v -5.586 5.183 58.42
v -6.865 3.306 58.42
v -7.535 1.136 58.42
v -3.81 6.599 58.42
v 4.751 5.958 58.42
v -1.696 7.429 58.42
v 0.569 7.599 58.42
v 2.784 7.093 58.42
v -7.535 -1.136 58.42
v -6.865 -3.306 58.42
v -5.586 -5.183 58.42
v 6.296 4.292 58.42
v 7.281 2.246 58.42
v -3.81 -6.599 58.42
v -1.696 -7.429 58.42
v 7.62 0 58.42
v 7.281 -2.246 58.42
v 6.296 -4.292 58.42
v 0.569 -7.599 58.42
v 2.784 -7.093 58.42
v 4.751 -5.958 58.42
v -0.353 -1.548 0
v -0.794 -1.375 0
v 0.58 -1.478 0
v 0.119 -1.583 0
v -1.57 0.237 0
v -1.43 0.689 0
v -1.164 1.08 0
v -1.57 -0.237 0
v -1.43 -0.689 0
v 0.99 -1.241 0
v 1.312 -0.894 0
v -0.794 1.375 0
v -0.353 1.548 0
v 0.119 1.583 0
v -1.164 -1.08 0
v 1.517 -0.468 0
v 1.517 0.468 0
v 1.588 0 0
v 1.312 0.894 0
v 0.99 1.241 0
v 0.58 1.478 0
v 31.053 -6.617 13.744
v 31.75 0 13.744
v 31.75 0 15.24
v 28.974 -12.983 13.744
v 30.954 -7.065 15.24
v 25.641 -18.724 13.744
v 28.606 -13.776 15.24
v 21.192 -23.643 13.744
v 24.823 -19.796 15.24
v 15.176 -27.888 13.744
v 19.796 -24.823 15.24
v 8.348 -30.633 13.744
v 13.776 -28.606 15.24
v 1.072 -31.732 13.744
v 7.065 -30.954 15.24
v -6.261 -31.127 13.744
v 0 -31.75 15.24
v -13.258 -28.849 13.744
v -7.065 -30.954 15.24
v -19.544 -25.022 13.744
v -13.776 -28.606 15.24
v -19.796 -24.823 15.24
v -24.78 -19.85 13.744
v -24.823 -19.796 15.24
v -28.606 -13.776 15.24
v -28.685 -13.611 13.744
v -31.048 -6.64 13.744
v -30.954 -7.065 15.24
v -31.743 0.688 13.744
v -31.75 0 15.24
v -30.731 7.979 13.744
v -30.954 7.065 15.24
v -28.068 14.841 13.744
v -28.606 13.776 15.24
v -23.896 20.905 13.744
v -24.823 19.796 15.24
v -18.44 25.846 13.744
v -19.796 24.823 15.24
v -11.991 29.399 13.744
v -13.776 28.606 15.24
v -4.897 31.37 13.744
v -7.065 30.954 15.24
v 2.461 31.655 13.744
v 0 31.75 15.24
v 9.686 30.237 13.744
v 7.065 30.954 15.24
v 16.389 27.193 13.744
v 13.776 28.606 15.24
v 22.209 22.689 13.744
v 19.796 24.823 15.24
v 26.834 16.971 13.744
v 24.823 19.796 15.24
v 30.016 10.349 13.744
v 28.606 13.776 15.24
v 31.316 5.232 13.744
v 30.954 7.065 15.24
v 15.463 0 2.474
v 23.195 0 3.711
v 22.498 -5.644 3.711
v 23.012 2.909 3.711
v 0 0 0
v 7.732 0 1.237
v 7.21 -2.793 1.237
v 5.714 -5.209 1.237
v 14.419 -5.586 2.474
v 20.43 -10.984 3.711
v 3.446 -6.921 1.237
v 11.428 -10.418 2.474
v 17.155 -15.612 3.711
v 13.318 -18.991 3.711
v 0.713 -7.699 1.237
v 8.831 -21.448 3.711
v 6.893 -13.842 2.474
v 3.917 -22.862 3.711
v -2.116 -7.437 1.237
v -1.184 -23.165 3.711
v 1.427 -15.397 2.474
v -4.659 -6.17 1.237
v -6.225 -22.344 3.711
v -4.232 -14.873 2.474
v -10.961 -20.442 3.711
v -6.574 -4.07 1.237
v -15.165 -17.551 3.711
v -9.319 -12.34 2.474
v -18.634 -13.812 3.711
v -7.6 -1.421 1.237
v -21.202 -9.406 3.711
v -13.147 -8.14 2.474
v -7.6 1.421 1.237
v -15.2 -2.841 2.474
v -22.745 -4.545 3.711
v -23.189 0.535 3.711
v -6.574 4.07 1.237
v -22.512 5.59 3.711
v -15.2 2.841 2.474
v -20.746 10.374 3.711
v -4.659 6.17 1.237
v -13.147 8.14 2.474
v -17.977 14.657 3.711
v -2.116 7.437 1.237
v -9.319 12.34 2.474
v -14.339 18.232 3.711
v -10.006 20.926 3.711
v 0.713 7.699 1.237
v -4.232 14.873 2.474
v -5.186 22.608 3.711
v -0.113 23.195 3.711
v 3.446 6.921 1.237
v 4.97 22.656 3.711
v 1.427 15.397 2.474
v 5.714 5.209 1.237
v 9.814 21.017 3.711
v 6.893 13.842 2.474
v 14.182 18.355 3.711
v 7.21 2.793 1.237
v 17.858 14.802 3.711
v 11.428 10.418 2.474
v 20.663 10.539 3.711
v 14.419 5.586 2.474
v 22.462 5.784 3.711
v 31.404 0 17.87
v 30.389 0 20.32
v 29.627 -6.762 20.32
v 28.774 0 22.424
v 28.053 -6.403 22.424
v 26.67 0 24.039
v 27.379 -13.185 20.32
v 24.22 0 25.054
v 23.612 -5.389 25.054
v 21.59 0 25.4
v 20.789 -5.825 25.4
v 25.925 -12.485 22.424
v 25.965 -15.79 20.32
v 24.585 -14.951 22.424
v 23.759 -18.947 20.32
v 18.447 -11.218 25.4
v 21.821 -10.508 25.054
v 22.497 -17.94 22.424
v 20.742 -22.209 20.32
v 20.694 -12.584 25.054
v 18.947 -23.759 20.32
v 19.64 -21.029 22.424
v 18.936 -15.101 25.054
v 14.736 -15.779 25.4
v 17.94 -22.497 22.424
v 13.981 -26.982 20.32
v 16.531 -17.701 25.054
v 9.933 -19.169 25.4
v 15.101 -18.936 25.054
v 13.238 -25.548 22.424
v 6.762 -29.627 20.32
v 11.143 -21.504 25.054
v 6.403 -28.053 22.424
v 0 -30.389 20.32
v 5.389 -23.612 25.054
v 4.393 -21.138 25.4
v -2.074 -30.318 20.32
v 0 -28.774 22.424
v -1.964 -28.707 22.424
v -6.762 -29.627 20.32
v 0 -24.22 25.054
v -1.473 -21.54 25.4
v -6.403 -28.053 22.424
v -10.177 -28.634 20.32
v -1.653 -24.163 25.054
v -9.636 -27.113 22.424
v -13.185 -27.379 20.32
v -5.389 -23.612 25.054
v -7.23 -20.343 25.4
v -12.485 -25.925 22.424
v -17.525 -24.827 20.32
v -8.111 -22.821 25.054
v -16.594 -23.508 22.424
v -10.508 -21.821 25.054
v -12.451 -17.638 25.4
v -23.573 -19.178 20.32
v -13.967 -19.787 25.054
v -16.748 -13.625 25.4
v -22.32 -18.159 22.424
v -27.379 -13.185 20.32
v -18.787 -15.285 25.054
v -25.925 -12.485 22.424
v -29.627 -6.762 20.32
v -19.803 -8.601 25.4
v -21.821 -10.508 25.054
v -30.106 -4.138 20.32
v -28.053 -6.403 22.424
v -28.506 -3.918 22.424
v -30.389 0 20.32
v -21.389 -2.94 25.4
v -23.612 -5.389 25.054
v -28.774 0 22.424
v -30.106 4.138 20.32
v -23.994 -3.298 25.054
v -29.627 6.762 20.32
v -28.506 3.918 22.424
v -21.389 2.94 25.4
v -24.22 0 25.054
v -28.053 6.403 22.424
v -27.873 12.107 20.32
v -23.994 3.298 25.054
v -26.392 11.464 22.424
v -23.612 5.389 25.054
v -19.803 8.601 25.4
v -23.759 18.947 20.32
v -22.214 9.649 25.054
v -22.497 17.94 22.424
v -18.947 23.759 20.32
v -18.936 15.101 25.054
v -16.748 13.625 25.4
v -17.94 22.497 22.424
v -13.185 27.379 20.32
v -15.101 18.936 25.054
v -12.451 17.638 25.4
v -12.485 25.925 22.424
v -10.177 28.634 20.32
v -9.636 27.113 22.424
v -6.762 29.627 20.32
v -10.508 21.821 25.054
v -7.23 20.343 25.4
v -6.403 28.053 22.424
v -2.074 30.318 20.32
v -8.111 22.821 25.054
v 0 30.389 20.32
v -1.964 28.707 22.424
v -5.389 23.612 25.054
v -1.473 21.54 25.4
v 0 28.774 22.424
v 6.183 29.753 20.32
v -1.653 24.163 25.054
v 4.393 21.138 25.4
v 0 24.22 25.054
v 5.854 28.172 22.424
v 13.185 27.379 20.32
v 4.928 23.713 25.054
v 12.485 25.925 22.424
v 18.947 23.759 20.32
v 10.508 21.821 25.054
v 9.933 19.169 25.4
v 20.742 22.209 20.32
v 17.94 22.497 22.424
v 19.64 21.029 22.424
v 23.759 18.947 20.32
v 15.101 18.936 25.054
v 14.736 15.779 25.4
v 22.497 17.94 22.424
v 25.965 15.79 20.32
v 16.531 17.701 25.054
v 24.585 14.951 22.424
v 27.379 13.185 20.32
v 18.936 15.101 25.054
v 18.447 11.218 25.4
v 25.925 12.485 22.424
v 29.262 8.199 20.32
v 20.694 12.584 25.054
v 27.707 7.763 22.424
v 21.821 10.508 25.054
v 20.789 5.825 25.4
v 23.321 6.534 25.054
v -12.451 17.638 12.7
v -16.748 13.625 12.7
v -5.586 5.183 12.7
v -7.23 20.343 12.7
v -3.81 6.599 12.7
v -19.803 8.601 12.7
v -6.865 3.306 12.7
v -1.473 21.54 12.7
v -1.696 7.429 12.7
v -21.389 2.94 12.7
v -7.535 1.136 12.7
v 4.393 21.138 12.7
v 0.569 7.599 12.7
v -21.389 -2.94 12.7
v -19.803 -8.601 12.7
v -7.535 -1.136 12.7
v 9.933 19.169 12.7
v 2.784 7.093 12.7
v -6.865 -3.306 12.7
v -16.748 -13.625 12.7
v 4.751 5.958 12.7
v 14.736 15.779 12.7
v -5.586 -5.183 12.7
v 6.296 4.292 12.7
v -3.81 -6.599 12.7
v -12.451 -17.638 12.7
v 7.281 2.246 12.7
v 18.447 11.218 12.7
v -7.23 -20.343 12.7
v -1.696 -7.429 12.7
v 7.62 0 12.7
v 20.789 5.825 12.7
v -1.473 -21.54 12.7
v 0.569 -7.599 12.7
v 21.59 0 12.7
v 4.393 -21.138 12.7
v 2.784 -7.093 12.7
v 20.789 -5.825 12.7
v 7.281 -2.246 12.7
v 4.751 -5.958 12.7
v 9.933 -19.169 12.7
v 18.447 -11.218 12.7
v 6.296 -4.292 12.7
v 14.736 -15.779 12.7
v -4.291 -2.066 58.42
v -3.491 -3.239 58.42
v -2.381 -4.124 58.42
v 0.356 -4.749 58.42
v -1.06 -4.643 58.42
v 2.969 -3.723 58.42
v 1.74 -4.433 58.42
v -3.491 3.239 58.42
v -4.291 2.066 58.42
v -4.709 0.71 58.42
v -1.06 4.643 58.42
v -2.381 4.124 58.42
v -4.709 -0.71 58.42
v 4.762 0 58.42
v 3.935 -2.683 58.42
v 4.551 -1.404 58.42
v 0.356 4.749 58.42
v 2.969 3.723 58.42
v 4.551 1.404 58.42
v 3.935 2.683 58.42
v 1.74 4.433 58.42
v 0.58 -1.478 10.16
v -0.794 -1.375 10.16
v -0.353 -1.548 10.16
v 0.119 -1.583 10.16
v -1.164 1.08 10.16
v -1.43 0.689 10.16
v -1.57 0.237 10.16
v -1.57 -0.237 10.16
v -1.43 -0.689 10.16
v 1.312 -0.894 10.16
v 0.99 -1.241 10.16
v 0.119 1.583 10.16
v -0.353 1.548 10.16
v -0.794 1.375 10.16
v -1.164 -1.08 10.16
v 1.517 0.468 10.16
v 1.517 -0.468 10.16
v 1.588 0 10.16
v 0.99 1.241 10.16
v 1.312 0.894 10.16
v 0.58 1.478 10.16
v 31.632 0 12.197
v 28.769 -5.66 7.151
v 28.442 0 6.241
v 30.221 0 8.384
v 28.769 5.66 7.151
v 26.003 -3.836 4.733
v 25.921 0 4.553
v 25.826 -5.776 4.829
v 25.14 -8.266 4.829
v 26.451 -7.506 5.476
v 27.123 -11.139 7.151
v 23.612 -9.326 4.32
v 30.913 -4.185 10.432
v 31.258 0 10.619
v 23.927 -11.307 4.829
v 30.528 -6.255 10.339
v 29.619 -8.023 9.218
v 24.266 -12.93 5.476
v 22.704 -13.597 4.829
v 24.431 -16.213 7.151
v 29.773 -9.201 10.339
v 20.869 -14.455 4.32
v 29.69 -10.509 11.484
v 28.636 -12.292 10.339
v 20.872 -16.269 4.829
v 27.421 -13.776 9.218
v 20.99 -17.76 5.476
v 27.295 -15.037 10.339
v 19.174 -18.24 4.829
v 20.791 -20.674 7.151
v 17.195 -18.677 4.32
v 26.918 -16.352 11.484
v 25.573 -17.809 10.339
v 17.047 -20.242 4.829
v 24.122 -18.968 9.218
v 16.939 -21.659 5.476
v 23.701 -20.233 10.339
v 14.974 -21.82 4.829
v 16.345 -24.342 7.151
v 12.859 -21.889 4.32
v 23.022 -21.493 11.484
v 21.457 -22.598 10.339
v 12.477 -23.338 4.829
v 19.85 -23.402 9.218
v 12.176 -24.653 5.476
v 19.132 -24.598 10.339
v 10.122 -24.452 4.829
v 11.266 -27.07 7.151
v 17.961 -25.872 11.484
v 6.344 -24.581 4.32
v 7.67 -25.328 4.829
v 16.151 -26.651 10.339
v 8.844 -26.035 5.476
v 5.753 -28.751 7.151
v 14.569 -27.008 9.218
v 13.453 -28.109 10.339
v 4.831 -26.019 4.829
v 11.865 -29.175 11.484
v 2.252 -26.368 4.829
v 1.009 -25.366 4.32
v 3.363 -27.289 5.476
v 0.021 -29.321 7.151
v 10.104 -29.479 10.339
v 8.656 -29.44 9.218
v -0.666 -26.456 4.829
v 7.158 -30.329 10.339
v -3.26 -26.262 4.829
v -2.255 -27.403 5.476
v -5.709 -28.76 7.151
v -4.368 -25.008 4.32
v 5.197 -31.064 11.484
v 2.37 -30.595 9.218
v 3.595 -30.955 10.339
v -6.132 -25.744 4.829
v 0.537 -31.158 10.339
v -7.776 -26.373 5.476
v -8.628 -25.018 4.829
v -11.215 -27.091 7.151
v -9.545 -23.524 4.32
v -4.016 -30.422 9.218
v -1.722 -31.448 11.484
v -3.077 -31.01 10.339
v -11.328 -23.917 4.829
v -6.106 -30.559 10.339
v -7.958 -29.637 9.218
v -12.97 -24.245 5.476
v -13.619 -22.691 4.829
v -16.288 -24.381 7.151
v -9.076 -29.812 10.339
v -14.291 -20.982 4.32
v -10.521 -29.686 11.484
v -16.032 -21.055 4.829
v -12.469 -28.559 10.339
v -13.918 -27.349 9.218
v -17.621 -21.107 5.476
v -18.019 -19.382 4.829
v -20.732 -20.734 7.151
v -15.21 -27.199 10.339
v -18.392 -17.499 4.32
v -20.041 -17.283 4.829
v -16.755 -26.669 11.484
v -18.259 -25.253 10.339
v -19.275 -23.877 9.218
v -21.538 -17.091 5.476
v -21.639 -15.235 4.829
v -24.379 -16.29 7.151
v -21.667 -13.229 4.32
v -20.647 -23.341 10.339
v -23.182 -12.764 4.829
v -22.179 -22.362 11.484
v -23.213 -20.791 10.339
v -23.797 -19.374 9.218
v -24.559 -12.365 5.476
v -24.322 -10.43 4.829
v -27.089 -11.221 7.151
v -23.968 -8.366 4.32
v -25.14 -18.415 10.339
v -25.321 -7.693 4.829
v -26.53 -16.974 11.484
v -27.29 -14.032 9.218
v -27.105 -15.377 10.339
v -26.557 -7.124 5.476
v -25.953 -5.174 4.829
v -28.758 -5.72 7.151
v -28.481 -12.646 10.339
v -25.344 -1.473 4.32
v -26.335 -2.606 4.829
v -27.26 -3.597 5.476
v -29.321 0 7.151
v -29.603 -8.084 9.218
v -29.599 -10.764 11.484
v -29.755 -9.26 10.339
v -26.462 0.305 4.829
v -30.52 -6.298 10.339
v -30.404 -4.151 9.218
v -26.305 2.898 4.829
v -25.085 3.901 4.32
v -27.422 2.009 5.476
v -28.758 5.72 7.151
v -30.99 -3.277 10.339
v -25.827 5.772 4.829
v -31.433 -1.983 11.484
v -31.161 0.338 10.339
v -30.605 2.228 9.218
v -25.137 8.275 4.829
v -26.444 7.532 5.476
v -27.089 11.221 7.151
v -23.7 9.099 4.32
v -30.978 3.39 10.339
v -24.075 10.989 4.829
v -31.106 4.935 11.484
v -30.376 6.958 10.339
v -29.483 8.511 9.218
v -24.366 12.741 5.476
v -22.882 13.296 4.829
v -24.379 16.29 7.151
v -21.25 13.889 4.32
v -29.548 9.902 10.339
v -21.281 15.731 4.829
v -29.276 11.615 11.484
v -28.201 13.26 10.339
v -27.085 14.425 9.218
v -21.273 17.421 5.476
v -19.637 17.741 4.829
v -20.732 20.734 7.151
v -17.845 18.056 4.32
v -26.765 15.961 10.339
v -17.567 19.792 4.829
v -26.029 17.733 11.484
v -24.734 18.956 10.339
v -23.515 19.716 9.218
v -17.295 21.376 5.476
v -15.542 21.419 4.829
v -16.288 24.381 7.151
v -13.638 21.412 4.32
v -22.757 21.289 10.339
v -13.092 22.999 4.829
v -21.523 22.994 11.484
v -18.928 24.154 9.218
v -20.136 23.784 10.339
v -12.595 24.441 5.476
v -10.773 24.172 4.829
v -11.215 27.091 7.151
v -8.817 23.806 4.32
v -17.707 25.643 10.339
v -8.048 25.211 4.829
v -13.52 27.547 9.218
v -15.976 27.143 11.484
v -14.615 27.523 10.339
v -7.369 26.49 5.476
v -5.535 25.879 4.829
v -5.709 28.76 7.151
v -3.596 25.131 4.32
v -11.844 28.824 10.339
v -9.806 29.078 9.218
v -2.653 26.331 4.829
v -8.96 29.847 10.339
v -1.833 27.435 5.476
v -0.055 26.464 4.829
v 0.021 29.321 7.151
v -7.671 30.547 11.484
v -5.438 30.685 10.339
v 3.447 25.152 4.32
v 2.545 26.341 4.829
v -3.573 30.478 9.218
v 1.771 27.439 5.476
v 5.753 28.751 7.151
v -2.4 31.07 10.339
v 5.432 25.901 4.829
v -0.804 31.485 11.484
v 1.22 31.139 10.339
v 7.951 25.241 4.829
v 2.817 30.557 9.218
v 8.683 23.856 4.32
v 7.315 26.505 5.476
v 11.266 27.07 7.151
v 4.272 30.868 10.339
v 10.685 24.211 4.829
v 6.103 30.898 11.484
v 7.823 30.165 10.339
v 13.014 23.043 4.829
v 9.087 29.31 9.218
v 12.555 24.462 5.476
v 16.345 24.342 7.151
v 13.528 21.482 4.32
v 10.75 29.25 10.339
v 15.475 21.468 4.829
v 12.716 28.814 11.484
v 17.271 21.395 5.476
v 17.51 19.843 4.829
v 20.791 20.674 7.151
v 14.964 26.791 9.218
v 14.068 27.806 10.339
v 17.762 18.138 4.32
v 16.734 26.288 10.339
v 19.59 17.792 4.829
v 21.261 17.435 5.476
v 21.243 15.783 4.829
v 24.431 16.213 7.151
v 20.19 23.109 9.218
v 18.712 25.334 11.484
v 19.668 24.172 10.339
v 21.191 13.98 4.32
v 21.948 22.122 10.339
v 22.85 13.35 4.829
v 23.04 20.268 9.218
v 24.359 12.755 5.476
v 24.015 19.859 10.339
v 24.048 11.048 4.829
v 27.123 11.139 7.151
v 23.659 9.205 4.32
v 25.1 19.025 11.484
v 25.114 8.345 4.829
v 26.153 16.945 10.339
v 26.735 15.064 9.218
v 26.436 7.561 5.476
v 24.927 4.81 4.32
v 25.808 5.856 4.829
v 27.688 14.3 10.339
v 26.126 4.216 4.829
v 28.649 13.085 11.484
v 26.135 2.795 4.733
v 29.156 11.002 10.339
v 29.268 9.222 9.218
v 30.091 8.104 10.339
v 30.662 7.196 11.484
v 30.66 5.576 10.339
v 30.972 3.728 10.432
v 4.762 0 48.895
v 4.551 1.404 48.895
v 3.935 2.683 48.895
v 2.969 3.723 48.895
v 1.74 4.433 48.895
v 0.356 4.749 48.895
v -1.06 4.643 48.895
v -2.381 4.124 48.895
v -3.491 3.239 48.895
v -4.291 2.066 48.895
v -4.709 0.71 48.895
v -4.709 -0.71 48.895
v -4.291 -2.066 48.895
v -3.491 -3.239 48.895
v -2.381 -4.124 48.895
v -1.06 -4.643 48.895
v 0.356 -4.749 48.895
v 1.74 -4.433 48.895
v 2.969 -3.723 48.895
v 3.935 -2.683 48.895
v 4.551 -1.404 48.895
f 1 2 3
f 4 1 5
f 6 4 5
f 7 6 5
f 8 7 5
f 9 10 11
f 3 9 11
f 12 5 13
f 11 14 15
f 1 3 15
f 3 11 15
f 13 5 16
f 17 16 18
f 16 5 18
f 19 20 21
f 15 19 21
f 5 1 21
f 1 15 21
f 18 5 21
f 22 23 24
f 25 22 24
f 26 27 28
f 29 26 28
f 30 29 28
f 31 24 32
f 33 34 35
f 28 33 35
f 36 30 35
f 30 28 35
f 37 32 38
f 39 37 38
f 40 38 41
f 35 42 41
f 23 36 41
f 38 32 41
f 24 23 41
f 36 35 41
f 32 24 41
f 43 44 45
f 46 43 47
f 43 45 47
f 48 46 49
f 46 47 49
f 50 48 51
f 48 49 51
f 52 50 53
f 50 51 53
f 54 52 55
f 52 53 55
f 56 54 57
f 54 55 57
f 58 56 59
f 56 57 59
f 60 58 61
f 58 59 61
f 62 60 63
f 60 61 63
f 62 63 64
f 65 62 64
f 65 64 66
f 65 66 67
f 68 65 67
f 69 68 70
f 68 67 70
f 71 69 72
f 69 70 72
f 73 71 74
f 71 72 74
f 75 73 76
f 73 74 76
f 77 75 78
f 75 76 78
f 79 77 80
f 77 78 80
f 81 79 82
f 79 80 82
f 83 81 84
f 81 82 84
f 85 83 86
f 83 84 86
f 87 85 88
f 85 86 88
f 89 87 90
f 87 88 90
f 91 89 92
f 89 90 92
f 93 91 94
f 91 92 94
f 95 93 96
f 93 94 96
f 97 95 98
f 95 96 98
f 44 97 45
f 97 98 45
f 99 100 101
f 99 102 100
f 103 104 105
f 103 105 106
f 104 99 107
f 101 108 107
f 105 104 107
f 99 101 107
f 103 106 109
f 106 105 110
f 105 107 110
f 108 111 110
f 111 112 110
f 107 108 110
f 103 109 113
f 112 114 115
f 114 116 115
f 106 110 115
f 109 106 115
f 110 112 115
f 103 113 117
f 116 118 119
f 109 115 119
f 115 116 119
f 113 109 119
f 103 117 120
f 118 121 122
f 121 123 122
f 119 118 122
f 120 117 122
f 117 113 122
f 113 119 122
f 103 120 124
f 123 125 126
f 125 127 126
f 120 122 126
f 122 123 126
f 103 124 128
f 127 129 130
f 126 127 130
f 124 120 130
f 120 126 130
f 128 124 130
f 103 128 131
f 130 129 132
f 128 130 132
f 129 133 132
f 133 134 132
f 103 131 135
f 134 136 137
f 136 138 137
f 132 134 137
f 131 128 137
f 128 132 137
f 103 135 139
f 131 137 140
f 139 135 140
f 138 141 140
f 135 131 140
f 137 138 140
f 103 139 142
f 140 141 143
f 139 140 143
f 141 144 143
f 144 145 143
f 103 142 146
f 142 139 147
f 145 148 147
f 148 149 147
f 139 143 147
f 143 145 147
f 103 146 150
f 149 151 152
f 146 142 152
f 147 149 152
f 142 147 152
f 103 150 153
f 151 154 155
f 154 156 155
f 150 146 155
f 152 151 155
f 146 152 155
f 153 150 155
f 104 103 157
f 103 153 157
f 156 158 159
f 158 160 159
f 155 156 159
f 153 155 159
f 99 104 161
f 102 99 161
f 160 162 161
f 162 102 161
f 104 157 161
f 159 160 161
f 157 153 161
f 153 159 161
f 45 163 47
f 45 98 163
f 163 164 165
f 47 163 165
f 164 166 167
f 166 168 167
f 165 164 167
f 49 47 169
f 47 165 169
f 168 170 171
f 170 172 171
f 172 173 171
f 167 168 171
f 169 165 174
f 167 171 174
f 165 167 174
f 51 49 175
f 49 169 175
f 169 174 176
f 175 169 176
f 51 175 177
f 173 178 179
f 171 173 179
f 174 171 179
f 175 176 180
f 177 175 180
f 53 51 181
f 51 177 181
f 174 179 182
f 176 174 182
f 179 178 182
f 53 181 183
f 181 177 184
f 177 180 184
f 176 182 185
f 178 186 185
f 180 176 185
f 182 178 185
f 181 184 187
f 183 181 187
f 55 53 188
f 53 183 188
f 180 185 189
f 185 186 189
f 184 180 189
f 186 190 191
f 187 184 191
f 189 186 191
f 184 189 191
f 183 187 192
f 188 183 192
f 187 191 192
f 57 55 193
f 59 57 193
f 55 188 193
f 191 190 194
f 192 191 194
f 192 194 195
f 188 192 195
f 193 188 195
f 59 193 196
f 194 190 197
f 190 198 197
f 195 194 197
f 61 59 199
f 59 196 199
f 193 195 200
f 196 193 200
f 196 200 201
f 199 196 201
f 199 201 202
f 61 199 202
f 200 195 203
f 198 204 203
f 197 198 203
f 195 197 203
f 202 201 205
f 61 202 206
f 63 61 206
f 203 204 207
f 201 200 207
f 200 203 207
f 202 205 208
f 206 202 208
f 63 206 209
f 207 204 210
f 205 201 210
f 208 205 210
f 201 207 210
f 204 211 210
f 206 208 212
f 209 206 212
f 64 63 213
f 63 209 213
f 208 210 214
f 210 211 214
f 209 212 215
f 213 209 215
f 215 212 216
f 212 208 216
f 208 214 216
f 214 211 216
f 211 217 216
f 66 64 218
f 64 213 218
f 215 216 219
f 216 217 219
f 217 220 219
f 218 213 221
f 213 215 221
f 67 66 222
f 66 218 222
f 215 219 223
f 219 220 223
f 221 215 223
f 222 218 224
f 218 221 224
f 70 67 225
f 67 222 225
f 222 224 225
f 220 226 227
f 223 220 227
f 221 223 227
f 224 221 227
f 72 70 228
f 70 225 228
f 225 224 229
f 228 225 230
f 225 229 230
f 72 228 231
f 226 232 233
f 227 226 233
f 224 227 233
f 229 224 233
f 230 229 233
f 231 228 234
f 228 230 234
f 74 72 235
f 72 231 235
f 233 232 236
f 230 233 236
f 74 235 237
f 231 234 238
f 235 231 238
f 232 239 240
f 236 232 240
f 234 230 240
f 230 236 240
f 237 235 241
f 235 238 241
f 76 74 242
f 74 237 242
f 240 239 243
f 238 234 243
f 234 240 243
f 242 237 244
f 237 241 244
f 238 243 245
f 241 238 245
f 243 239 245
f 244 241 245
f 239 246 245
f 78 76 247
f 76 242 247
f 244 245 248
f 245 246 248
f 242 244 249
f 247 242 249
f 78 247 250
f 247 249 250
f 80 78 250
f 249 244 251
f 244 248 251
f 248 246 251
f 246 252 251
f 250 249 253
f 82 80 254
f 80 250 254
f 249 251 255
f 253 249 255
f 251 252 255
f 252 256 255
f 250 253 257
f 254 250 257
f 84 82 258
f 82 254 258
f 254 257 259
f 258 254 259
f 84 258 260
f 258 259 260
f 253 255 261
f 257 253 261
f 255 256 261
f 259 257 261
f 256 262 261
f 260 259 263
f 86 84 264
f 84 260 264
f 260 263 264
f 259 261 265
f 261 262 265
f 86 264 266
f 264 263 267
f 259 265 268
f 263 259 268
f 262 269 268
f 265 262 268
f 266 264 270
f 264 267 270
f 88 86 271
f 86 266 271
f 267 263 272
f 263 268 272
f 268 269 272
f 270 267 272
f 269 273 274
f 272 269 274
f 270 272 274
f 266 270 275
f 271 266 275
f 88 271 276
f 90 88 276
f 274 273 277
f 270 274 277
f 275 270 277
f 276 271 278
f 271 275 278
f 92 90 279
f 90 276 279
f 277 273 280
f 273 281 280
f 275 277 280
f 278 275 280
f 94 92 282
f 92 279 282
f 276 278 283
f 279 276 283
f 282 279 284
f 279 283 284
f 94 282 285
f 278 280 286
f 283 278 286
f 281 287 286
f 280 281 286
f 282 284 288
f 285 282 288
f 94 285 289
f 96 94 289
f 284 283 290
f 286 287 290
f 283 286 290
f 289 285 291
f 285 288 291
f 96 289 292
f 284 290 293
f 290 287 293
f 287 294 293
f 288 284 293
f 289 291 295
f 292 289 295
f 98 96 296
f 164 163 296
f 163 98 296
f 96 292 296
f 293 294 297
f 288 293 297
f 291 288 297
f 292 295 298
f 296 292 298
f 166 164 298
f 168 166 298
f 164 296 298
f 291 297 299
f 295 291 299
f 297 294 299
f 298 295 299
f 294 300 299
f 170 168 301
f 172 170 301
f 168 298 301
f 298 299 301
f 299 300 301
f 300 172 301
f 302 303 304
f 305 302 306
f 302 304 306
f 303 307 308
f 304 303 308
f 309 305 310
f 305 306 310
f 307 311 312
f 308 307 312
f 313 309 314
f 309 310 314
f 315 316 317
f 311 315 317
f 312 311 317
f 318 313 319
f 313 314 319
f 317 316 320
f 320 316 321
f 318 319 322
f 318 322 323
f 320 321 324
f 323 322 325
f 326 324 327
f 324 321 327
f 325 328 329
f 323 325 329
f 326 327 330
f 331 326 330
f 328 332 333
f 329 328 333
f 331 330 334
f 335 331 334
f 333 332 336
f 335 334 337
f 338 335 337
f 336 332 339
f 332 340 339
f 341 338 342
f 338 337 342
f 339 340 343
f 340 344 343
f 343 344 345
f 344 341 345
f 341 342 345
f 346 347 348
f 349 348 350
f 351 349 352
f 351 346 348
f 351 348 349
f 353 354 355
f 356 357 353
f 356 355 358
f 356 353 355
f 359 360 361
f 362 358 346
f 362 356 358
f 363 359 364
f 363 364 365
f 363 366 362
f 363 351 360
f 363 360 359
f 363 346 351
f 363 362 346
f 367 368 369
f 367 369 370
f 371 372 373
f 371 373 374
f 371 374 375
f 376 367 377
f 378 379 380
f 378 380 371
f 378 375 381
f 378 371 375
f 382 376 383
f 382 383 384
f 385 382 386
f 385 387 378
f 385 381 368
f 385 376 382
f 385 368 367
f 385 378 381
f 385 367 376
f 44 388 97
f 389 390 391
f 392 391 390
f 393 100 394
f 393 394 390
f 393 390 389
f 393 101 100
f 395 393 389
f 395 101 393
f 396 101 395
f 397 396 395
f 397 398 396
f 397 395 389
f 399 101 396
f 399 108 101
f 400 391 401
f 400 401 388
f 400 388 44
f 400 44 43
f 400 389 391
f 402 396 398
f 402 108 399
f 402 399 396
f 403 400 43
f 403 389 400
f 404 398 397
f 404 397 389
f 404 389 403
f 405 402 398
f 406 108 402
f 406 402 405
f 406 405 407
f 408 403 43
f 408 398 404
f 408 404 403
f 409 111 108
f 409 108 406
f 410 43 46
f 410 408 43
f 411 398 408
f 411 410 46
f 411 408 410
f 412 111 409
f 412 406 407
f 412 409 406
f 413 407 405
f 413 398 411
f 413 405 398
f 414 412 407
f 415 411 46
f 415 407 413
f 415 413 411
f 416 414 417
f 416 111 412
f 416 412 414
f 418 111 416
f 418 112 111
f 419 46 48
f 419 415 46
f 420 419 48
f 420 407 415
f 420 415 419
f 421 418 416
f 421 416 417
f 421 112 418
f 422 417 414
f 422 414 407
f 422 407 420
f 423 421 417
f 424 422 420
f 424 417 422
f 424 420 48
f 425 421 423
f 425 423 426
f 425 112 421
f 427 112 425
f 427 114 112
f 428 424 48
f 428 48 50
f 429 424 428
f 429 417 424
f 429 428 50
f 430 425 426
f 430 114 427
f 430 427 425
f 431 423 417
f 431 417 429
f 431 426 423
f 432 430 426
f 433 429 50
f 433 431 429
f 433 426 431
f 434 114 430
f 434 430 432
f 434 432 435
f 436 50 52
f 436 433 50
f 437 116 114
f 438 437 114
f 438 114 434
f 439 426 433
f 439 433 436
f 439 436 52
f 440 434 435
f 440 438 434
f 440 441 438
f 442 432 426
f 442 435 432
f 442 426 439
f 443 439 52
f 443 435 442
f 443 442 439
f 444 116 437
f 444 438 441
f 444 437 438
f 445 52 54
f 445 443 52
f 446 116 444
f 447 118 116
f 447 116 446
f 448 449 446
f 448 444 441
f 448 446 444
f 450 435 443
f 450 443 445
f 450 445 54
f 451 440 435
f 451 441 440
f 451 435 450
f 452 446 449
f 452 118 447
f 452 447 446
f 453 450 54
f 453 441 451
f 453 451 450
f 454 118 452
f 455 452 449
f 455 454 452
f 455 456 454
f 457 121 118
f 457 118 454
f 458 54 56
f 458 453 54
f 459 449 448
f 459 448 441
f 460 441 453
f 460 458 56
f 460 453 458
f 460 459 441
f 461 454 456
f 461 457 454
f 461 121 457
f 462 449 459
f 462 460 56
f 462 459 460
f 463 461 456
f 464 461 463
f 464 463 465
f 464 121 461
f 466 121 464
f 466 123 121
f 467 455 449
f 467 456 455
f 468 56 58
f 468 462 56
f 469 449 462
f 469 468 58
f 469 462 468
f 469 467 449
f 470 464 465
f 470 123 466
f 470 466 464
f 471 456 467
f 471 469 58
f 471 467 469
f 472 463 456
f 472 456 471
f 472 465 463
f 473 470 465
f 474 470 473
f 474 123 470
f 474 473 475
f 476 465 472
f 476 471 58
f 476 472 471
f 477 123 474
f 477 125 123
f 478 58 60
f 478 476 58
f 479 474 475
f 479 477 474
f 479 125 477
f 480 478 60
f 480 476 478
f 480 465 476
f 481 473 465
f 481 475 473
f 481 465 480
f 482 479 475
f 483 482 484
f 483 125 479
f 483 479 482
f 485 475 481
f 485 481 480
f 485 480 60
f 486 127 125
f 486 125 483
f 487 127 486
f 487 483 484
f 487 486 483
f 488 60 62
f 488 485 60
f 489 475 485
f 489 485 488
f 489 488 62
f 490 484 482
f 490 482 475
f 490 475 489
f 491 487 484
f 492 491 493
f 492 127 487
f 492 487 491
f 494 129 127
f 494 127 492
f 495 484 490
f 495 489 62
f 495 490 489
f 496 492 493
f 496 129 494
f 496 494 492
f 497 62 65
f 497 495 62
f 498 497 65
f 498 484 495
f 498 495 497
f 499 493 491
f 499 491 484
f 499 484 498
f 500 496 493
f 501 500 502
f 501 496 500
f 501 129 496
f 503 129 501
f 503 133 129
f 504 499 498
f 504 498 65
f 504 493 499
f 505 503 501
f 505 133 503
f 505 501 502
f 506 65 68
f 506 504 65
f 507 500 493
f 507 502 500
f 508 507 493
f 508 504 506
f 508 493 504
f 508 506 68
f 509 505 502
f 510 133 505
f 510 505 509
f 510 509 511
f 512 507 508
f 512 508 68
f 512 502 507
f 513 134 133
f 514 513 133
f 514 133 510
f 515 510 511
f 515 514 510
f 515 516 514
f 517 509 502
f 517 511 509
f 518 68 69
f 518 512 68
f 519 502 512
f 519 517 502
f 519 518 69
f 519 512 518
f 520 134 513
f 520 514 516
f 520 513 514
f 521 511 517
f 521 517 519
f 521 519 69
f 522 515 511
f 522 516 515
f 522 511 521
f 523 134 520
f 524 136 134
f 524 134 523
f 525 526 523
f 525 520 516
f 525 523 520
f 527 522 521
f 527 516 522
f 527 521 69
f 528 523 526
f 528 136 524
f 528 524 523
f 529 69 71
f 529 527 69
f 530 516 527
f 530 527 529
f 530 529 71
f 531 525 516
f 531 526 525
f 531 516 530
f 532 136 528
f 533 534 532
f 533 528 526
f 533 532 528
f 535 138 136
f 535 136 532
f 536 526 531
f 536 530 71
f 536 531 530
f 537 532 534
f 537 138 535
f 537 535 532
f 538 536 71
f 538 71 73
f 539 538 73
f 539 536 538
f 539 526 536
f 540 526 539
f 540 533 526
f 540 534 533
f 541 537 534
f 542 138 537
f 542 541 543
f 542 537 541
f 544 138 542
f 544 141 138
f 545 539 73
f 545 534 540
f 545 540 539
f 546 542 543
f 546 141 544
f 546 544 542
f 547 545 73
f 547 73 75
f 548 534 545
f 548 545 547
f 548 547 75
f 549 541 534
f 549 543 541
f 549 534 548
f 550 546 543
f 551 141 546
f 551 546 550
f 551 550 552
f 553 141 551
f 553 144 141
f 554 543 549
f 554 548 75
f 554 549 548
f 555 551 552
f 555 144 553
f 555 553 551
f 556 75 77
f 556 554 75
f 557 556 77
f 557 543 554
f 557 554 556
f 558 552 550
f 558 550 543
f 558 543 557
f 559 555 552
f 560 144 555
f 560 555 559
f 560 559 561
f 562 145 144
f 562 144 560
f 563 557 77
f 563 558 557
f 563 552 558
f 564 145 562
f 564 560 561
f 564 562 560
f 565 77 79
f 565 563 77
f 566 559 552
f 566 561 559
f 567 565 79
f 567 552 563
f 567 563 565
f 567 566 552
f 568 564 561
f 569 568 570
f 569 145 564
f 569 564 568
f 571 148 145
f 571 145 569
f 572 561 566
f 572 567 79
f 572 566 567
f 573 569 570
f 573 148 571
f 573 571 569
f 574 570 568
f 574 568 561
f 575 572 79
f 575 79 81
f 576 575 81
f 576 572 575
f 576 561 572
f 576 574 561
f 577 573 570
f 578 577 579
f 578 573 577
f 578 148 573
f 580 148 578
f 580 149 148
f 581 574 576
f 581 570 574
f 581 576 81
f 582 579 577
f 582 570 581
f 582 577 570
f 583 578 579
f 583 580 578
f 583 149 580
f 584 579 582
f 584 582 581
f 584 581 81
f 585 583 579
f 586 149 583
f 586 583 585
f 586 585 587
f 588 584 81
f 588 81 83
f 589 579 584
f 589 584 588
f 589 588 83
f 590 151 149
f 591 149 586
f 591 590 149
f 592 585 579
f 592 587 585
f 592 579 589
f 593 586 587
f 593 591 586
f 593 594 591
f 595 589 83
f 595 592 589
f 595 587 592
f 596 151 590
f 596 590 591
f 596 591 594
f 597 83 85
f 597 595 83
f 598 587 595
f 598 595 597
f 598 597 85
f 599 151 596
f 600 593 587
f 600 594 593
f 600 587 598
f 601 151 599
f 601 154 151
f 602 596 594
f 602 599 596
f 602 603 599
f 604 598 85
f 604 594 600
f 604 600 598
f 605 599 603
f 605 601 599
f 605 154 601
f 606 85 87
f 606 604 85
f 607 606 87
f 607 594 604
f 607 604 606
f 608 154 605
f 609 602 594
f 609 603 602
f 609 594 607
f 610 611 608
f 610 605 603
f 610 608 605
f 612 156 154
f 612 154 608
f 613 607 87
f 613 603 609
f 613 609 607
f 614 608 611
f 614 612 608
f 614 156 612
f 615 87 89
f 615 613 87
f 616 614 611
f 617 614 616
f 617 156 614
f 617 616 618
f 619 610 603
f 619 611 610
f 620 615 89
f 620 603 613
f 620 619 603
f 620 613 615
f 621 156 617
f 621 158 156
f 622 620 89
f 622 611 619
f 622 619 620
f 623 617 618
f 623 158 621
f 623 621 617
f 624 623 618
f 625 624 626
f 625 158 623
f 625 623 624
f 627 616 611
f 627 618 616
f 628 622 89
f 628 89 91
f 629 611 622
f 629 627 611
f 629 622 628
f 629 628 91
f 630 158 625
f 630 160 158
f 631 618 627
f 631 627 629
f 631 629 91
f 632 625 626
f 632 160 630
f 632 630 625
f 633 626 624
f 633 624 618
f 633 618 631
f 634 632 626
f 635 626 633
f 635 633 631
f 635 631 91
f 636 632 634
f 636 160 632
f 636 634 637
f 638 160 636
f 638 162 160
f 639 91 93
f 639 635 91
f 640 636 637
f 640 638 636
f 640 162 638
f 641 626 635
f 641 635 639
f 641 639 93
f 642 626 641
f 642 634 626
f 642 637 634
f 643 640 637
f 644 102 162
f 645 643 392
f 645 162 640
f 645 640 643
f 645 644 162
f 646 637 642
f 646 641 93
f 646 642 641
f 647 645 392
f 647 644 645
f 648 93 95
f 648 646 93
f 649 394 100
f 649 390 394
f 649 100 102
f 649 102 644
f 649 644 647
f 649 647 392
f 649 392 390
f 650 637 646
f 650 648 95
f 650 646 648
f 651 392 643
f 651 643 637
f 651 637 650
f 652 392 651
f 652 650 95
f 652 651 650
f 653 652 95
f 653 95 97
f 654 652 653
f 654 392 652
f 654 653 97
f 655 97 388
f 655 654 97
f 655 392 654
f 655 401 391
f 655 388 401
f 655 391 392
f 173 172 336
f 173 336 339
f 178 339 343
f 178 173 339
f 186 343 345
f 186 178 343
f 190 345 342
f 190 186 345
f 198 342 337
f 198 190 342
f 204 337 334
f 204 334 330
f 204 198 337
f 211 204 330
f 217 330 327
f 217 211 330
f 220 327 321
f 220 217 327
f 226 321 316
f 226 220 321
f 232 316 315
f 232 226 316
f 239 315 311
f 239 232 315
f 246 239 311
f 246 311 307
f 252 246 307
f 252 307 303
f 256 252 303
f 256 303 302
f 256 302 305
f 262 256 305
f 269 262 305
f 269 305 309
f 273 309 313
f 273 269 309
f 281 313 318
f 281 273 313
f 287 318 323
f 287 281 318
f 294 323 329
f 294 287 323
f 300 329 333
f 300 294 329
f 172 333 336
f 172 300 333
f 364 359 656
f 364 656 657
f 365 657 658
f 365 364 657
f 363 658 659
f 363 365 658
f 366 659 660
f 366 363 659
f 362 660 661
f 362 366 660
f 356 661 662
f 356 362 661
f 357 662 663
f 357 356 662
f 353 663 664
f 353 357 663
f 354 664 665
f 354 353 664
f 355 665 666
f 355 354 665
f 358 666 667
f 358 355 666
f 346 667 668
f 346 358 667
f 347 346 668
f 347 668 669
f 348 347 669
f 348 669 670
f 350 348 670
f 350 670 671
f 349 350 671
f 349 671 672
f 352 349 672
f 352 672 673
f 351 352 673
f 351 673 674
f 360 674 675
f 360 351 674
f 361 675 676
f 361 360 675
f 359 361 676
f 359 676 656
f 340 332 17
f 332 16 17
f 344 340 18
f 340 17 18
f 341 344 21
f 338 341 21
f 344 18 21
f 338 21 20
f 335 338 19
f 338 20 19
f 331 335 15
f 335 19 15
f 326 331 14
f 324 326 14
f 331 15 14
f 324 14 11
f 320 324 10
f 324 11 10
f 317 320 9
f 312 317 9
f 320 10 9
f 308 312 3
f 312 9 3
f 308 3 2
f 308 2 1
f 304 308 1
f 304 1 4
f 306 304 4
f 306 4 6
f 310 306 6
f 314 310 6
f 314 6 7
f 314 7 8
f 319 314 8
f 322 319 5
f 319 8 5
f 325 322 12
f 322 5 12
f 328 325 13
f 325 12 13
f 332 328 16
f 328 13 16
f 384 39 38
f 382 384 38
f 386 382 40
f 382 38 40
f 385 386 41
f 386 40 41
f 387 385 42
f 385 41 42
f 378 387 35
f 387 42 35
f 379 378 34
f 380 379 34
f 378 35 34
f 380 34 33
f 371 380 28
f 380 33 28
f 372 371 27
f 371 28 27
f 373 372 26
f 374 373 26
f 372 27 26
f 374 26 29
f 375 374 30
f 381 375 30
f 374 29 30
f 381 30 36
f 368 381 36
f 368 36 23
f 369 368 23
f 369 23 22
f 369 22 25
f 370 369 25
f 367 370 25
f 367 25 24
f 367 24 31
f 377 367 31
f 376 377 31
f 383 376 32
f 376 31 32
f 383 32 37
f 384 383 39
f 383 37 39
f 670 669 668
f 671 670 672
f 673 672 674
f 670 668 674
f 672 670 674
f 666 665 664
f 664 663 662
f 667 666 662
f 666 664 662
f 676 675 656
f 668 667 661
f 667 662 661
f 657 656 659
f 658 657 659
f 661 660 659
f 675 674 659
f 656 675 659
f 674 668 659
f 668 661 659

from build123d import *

# Parameters (mm, degrees)
F2_R     = 10.16
F3_R     = 1.5875
F4_DEPTH = 10.16
F5_R     = 4.7625
F6_DEPTH = 9.525
F7_DEPTH = 12.7


with BuildPart() as f1:
    # F0 (on Front) → F1 (revolve)
    with BuildSketch(Plane.XZ):
        Polygon((0, 58.42), (0, 0), (31.75, 5.08), (31.75, 25.4), (7.62, 25.4), (7.62, 58.42), align=None)
    revolve(axis=Axis((0, 0, 29.21), (0, 0, -1)))

    # F2
    f2_edges = [f1.edges().sort_by_distance(p)[0] for p in [
        (-31.75, 0, 5.08),
        (-31.75, 0, 25.4),
        (31.75, 0, 15.24),
    ]]
    fillet(f2_edges, radius=F2_R)

    # F7 (cut): a face of the model
    f7_faces = [f1.faces().sort_by_distance(p)[0] for p in [
        (-20.9793425838, 0, 25.4),
    ]]
    extrude(f7_faces, amount=-F7_DEPTH, mode=Mode.SUBTRACT)


with BuildPart() as f4:
    # F3 (on Top) → F4 (new body)
    with BuildSketch(Plane.XY):
        Circle(F3_R)
    extrude(amount=F4_DEPTH)


with BuildPart() as f6:
    # F5 (on face) → F6 (new body)
    with BuildSketch(Plane.XY.offset(58.42)):
        Circle(F5_R)
    extrude(amount=-F6_DEPTH)


solid = Compound([f1.part, f4.part, f6.part])
